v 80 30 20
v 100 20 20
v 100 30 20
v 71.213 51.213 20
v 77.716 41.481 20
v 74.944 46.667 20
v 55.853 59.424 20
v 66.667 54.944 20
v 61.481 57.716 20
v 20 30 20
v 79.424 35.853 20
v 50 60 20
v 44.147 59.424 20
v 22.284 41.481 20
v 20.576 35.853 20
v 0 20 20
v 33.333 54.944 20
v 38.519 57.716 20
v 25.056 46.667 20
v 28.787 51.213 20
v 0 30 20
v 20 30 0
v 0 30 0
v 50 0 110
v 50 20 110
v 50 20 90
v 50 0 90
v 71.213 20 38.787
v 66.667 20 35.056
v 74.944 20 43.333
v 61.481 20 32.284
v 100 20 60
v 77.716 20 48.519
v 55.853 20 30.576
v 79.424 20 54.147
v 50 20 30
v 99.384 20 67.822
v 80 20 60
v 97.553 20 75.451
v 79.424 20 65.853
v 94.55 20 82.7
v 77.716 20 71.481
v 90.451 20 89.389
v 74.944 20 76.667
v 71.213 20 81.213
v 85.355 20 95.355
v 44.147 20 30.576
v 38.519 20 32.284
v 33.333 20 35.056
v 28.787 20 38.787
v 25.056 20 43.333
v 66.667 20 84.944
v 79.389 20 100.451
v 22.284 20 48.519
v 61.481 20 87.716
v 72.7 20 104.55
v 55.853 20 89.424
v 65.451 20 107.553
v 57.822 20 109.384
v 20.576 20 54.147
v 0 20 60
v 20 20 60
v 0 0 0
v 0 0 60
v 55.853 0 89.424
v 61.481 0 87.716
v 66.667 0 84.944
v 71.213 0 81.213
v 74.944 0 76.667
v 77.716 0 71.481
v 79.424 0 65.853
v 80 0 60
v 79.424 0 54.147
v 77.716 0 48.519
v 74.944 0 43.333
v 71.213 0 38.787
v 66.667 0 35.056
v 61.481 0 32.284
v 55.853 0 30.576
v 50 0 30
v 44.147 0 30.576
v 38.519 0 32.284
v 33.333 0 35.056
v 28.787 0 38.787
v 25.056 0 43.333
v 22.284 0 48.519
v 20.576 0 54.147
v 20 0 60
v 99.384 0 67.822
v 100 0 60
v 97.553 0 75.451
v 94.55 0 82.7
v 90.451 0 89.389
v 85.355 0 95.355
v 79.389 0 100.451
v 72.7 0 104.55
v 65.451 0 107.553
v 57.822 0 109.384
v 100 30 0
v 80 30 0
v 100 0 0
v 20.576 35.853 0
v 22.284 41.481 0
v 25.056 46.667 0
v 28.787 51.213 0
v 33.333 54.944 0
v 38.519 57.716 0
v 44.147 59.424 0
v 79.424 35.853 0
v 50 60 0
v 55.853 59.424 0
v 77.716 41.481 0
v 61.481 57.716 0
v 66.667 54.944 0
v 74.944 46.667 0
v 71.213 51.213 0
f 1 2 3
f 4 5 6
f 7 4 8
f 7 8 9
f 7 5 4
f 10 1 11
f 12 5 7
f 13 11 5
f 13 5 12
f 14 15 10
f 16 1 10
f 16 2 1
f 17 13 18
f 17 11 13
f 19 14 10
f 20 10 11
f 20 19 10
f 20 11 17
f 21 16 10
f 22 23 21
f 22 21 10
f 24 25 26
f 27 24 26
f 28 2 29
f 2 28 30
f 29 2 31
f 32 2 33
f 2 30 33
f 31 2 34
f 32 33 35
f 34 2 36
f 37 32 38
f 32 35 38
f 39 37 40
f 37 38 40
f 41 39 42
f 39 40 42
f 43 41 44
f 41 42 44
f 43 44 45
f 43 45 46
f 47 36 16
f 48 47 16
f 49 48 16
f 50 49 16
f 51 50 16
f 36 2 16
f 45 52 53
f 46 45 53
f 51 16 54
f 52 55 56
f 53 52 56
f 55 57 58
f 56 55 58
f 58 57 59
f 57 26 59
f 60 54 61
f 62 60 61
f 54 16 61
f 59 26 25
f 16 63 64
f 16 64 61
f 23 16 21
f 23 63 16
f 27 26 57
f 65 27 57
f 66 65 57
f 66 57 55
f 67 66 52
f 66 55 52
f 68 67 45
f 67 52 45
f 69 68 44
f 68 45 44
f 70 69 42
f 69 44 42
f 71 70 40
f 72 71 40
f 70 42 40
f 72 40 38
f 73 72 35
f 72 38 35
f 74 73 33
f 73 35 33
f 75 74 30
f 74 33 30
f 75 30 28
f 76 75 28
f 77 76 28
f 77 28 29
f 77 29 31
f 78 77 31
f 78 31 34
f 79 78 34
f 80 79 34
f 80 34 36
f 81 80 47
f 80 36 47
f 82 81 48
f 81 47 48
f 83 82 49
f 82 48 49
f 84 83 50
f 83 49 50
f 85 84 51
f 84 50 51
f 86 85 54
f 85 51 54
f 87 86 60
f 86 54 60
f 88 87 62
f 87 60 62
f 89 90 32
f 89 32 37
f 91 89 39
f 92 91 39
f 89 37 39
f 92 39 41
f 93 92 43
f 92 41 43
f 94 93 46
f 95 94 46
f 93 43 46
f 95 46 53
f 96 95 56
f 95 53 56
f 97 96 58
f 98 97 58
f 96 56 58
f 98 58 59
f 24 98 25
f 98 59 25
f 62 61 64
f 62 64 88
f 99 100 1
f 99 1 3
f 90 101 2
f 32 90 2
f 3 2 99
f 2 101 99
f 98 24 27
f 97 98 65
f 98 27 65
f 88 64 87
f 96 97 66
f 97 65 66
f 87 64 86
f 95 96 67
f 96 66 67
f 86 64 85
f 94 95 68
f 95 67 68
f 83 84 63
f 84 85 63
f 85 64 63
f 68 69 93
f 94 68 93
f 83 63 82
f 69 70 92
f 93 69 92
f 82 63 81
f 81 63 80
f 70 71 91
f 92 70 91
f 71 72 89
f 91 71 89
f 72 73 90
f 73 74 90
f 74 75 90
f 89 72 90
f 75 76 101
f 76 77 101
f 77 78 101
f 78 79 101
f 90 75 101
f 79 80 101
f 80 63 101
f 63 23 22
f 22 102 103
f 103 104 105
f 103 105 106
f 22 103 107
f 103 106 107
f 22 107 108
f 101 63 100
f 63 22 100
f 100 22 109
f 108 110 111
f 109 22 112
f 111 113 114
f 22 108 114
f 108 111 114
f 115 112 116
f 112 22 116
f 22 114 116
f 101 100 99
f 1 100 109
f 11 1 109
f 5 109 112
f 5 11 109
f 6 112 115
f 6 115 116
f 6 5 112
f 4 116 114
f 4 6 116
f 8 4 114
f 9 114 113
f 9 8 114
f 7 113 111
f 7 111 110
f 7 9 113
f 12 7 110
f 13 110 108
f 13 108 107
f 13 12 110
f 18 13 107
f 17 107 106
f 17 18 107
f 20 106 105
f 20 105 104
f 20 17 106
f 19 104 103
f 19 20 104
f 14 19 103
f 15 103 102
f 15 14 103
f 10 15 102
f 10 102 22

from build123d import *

# Parameters (mm, degrees)
SKETCH1_W           = 100
SKETCH1_H           = 30
BOSS_EXTRUDE1_DEPTH = 110
SKETCH2_W           = 90
SKETCH2_H           = 10
CUT_EXTRUDE1_DEPTH  = 110
BOSS_EXTRUDE2_DEPTH = 20
CUT_EXTRUDE2_DEPTH  = 20
SKETCH5_W           = 50
SKETCH5_H           = 50
CUT_EXTRUDE3_DEPTH  = 20
CUT_EXTRUDE4_DEPTH  = 20


with BuildPart() as part:
    # Sketch1 → Boss-Extrude1 (new body)
    with BuildSketch(Plane.XY):
        with Locations((50, 15)):
            Rectangle(SKETCH1_W, SKETCH1_H)
    extrude(amount=BOSS_EXTRUDE1_DEPTH)

    # Sketch2 → Cut-Extrude1 (cut)
    with BuildSketch(Plane.ZY):
        with Locations((65, 25)):
            Rectangle(SKETCH2_W, SKETCH2_H)
    extrude(amount=-CUT_EXTRUDE1_DEPTH, mode=Mode.SUBTRACT)

    # Sketch3 → Boss-Extrude2 (add)
    with BuildSketch(Plane.XY.offset(20)):
        with BuildLine():
            Line((20, 30), (80, 30))
            ThreePointArc((80, 30), (50, 60), (20, 30))
        make_face()
    extrude(amount=-BOSS_EXTRUDE2_DEPTH)

    # Sketch4 → Cut-Extrude2 (cut)
    with BuildSketch(Plane(origin=(0, 20, 0), x_dir=(1, 0, 0), z_dir=(0, 1, 0))):
        with BuildLine():
            Line((50, -110), (100, -110))
            Line((100, -110), (100, -60))
            ThreePointArc((100, -60), (85.355339059, -95.355339059), (50, -110))
        make_face()
    extrude(amount=-CUT_EXTRUDE2_DEPTH, mode=Mode.SUBTRACT)

    # Sketch5 → Cut-Extrude3 (cut)
    with BuildSketch(Plane(origin=(0, 20, 0), x_dir=(1, 0, 0), z_dir=(0, 1, 0))):
        with Locations((25, -85)):
            Rectangle(SKETCH5_W, SKETCH5_H)
    extrude(amount=-CUT_EXTRUDE3_DEPTH, mode=Mode.SUBTRACT)

    # Sketch6 → Cut-Extrude4 (cut)
    with BuildSketch(Plane(origin=(0, 20, 0), x_dir=(1, 0, 0), z_dir=(0, 1, 0))):
        with BuildLine():
            Line((20, -60), (50, -60))
            Line((50, -60), (50, -90))
            ThreePointArc((50, -90), (71.213203436, -38.786796564), (20, -60))
        make_face()
    extrude(amount=-CUT_EXTRUDE4_DEPTH, mode=Mode.SUBTRACT)


solid = part.part
